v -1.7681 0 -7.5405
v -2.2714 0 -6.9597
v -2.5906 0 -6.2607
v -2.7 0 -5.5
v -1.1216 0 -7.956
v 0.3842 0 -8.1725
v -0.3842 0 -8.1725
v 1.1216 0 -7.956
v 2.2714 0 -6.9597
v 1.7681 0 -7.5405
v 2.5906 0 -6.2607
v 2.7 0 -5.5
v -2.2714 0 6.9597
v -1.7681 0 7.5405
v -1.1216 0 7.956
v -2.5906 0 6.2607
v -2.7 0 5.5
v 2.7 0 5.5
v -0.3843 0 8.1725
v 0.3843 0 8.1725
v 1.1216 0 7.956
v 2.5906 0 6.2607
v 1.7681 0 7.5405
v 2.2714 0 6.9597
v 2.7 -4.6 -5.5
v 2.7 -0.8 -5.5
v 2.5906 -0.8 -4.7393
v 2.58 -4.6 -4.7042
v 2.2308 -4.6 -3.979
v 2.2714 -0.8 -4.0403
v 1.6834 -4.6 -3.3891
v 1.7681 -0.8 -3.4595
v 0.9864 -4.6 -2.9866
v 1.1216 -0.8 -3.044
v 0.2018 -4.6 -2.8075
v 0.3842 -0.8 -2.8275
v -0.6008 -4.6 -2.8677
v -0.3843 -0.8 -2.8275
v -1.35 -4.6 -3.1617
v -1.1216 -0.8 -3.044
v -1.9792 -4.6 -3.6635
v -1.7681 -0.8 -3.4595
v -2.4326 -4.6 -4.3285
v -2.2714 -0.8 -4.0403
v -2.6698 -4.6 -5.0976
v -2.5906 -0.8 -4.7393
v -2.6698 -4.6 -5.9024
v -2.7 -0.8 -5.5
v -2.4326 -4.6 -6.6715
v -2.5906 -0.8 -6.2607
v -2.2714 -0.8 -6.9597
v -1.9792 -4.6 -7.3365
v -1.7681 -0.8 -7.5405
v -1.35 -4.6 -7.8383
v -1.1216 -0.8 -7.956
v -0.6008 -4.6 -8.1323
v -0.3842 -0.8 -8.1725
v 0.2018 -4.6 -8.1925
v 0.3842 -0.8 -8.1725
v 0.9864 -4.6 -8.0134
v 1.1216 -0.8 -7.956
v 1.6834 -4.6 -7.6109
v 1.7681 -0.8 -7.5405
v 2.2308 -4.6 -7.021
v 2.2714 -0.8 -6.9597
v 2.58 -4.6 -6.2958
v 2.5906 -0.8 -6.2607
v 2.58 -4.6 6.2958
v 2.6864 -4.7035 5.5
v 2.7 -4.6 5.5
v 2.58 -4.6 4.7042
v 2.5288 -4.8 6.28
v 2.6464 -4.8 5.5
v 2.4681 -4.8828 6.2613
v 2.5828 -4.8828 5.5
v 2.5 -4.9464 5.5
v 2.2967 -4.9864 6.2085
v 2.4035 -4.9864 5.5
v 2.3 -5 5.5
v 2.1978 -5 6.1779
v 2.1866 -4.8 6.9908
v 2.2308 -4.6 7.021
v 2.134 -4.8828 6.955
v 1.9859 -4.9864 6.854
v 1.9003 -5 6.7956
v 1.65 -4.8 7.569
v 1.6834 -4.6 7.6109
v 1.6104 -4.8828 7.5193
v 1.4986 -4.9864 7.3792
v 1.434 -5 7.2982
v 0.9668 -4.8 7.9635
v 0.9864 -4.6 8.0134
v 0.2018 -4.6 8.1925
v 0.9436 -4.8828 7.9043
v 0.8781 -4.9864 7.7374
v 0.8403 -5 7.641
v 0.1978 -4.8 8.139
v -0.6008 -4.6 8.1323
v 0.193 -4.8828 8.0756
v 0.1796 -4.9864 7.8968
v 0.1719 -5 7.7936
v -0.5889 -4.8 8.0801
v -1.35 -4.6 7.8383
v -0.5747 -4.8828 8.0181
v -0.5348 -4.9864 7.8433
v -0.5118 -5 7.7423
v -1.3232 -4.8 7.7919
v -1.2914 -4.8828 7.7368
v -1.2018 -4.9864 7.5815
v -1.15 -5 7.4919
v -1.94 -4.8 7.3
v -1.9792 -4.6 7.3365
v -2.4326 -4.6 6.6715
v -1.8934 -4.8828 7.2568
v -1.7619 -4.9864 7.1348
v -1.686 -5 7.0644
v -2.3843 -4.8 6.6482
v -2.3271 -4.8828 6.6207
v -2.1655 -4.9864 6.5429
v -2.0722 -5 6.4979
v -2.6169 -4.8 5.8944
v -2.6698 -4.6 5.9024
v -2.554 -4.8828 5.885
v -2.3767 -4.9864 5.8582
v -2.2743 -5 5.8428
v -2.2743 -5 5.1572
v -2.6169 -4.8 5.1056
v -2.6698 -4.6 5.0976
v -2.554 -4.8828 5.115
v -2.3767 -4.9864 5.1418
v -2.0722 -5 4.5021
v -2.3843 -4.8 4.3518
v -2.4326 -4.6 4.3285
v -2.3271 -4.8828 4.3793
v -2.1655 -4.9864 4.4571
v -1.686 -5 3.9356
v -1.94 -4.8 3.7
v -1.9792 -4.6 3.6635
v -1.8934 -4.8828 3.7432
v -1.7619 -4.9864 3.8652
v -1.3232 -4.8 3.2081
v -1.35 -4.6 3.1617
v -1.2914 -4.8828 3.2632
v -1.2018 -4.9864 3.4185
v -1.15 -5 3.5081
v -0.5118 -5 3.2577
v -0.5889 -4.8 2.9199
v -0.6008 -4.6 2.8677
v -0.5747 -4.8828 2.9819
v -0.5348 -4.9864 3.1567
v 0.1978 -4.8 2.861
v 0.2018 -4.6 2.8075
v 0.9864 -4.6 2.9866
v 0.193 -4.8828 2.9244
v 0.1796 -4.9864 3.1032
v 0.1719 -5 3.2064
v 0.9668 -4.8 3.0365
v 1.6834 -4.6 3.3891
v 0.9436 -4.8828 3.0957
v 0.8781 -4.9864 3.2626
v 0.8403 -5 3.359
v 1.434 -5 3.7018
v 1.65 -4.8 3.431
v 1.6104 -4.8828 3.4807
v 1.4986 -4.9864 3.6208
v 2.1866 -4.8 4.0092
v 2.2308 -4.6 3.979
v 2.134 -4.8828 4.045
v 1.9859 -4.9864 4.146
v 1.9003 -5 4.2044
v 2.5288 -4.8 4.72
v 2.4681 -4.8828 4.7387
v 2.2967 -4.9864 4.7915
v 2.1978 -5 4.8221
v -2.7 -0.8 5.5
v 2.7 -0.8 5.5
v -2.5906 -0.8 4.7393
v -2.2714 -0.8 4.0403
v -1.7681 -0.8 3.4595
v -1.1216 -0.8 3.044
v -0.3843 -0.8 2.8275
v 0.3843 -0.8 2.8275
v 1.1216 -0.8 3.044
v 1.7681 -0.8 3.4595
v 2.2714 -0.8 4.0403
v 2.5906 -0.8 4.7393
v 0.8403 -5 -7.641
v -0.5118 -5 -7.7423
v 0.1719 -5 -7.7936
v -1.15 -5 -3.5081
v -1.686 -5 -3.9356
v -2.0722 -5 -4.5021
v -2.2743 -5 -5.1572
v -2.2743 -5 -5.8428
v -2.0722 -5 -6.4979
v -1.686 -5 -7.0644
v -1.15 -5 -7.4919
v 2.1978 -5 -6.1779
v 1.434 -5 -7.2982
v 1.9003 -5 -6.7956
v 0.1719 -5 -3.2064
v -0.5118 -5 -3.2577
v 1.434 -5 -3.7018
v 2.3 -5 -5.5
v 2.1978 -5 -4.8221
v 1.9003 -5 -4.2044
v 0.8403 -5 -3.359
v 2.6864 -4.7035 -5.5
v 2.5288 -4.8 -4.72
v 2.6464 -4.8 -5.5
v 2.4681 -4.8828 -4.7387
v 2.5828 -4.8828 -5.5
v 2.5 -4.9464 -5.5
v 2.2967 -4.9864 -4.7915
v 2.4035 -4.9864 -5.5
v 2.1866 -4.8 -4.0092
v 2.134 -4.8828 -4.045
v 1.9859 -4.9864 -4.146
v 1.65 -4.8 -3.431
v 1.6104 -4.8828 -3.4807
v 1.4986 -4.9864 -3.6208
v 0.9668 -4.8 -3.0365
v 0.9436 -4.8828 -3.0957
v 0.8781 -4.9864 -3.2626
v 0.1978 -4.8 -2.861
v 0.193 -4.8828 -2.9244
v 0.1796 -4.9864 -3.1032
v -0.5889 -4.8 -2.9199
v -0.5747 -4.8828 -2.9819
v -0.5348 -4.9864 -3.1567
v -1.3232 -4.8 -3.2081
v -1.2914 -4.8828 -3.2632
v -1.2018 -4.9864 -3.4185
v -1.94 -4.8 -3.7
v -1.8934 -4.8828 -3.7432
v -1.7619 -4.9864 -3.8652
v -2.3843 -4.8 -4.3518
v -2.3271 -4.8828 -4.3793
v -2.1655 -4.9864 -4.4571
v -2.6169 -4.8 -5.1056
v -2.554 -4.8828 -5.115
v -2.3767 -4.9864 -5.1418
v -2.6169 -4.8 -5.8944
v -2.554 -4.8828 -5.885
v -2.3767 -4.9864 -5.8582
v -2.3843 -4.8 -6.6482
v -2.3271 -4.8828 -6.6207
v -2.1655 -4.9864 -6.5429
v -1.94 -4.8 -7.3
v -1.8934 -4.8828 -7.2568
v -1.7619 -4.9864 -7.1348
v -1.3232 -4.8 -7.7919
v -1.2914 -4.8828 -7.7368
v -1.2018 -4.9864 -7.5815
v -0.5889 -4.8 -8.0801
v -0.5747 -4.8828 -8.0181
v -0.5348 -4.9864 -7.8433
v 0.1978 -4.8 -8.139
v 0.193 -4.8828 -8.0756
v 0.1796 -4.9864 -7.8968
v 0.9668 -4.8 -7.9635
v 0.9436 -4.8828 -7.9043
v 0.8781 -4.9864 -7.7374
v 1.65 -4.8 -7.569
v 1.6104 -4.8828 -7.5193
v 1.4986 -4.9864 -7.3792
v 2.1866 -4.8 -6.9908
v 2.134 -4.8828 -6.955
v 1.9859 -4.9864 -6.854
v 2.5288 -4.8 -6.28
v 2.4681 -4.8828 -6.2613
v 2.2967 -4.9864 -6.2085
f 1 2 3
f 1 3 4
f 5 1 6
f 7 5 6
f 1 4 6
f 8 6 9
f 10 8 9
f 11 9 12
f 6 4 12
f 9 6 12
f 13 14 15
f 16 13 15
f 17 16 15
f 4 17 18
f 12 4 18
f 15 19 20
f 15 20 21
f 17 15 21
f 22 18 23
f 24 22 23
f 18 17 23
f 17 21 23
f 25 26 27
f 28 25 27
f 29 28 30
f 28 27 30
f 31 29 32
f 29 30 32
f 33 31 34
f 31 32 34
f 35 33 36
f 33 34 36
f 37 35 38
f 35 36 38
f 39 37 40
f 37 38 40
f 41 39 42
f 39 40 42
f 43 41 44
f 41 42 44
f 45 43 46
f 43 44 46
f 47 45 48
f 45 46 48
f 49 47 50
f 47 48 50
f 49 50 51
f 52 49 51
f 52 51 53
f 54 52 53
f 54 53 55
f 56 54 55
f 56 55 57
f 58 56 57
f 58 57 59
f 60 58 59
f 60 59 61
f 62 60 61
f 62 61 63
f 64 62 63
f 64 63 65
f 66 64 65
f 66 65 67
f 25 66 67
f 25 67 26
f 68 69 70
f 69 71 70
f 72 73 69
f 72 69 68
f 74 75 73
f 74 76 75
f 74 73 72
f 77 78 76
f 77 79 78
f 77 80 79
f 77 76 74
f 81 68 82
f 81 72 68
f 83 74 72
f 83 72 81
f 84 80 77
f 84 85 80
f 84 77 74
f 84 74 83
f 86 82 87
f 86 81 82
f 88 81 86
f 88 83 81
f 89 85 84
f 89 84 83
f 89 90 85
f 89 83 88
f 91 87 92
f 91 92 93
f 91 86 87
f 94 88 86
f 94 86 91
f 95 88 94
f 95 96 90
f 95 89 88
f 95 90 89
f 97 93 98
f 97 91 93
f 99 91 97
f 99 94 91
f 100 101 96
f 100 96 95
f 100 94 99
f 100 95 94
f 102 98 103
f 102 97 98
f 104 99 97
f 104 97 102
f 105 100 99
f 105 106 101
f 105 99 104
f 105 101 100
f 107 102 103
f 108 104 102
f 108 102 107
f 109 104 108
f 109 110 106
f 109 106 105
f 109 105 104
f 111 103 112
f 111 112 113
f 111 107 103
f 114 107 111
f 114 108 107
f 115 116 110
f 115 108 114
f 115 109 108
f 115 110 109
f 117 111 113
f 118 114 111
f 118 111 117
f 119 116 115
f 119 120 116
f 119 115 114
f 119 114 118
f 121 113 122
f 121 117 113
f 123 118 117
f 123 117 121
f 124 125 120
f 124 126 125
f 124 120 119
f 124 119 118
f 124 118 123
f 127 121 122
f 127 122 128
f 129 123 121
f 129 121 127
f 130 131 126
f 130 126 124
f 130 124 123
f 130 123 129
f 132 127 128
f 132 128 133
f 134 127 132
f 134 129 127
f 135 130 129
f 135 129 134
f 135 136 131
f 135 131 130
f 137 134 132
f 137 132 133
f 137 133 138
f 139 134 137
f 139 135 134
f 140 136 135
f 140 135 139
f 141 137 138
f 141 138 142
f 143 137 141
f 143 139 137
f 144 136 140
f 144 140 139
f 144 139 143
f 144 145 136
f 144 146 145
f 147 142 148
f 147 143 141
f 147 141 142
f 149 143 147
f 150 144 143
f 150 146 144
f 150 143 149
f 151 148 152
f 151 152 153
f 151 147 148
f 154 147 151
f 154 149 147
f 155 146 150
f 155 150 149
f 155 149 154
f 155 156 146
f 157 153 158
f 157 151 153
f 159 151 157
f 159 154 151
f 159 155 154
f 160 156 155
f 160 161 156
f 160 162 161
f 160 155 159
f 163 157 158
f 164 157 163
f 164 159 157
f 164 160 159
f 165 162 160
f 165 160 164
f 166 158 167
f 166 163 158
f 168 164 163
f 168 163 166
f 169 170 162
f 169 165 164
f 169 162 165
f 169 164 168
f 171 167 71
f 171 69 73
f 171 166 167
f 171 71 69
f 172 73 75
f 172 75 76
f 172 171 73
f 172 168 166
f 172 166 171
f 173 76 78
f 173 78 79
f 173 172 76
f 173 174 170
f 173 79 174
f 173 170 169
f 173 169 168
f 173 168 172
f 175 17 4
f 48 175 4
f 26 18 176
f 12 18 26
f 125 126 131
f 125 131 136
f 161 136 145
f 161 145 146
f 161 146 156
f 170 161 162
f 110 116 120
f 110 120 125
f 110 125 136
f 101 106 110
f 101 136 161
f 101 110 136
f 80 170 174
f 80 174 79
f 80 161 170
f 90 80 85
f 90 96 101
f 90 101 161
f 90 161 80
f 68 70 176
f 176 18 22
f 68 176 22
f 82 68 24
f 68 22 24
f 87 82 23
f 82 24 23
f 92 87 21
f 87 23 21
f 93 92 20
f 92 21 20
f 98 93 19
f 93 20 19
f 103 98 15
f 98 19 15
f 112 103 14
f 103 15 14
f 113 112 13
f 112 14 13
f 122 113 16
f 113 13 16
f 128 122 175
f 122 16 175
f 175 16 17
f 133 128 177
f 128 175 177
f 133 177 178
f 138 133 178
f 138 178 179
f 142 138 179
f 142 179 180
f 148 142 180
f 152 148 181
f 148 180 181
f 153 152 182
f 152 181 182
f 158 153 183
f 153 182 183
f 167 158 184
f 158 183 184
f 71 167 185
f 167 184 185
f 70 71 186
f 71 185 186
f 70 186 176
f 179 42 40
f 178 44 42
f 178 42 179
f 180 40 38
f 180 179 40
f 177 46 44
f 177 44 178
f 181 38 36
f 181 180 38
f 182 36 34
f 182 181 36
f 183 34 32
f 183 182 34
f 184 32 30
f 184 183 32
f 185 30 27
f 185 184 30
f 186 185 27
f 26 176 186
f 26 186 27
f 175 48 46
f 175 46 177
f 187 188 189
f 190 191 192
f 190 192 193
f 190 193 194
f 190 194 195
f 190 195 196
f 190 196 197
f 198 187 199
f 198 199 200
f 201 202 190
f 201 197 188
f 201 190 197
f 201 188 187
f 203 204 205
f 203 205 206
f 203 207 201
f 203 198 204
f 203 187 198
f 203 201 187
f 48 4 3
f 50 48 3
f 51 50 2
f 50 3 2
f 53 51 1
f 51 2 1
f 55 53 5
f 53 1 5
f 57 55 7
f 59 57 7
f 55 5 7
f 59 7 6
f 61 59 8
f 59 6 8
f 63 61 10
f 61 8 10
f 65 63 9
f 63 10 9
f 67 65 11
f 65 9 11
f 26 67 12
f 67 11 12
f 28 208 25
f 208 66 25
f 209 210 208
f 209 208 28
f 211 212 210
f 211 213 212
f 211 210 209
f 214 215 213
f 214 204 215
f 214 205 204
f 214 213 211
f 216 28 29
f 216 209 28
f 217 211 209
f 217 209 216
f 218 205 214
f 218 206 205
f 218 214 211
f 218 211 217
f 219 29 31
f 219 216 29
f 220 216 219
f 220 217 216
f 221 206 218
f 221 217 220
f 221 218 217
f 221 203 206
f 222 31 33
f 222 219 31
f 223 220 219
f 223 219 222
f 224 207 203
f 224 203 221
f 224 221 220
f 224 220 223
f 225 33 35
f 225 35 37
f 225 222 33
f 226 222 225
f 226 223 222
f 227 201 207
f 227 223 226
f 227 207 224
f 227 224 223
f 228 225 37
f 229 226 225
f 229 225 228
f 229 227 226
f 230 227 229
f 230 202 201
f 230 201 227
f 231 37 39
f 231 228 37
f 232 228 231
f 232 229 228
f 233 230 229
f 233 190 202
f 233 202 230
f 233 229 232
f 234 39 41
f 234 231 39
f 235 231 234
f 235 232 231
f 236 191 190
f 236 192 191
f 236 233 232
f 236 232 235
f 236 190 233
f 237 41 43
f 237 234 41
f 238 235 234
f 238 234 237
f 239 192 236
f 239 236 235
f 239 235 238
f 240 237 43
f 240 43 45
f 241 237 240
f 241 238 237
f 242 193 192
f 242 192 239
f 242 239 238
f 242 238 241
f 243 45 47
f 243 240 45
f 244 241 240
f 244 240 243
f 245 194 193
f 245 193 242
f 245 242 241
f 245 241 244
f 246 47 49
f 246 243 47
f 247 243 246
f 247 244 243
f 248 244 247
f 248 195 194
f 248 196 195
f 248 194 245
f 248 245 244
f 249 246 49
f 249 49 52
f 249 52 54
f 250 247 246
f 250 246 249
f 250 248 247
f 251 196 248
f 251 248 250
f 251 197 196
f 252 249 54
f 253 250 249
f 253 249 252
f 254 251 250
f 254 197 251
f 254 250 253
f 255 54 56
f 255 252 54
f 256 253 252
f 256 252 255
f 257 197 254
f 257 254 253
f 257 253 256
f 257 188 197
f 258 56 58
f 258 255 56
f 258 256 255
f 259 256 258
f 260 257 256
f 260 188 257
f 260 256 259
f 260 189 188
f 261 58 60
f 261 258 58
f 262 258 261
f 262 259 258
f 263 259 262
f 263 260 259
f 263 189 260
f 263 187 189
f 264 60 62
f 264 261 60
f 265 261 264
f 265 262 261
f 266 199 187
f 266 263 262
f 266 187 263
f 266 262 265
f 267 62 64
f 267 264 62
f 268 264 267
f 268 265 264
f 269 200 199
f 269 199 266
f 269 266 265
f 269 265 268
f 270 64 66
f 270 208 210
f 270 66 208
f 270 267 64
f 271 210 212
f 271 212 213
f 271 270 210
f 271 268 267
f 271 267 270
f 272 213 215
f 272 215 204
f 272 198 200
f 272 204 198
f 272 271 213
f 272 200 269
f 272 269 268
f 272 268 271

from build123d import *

# Parameters (mm, degrees)
PAD002_DEPTH = 0.8
SKETCH079_R  = 2.7
PAD003_DEPTH = 5
FILLET001_R  = 0.4


with BuildPart() as part:
    # Sketch078 → Pad002 (new body)
    with BuildSketch(Plane.XZ):
        with BuildLine():
            ThreePointArc((2.7, 5.5), (0, 8.2), (-2.7, 5.5))
            Line((-2.7, 5.5), (-2.7, -5.500015))
            ThreePointArc((-2.7, -5.500015), (0, -8.2), (2.7, -5.500015))
            Line((2.7, 5.5), (2.7, -5.500015))
        make_face()
    extrude(amount=PAD002_DEPTH)

    # Sketch079 → Pad003 (join)
    with BuildSketch(Plane.XZ):
        with Locations((0, 5.5)):
            Circle(SKETCH079_R)
        with Locations((0, -5.5)):
            Circle(SKETCH079_R)
    extrude(amount=PAD003_DEPTH)

    # Fillet001
    fillet001_edges = [part.edges().sort_by_distance(p)[0] for p in [
        (-2.7, -5, -5.5),
        (-2.7, -5, 5.5),
    ]]
    fillet(fillet001_edges, radius=FILLET001_R)


solid = part.part
